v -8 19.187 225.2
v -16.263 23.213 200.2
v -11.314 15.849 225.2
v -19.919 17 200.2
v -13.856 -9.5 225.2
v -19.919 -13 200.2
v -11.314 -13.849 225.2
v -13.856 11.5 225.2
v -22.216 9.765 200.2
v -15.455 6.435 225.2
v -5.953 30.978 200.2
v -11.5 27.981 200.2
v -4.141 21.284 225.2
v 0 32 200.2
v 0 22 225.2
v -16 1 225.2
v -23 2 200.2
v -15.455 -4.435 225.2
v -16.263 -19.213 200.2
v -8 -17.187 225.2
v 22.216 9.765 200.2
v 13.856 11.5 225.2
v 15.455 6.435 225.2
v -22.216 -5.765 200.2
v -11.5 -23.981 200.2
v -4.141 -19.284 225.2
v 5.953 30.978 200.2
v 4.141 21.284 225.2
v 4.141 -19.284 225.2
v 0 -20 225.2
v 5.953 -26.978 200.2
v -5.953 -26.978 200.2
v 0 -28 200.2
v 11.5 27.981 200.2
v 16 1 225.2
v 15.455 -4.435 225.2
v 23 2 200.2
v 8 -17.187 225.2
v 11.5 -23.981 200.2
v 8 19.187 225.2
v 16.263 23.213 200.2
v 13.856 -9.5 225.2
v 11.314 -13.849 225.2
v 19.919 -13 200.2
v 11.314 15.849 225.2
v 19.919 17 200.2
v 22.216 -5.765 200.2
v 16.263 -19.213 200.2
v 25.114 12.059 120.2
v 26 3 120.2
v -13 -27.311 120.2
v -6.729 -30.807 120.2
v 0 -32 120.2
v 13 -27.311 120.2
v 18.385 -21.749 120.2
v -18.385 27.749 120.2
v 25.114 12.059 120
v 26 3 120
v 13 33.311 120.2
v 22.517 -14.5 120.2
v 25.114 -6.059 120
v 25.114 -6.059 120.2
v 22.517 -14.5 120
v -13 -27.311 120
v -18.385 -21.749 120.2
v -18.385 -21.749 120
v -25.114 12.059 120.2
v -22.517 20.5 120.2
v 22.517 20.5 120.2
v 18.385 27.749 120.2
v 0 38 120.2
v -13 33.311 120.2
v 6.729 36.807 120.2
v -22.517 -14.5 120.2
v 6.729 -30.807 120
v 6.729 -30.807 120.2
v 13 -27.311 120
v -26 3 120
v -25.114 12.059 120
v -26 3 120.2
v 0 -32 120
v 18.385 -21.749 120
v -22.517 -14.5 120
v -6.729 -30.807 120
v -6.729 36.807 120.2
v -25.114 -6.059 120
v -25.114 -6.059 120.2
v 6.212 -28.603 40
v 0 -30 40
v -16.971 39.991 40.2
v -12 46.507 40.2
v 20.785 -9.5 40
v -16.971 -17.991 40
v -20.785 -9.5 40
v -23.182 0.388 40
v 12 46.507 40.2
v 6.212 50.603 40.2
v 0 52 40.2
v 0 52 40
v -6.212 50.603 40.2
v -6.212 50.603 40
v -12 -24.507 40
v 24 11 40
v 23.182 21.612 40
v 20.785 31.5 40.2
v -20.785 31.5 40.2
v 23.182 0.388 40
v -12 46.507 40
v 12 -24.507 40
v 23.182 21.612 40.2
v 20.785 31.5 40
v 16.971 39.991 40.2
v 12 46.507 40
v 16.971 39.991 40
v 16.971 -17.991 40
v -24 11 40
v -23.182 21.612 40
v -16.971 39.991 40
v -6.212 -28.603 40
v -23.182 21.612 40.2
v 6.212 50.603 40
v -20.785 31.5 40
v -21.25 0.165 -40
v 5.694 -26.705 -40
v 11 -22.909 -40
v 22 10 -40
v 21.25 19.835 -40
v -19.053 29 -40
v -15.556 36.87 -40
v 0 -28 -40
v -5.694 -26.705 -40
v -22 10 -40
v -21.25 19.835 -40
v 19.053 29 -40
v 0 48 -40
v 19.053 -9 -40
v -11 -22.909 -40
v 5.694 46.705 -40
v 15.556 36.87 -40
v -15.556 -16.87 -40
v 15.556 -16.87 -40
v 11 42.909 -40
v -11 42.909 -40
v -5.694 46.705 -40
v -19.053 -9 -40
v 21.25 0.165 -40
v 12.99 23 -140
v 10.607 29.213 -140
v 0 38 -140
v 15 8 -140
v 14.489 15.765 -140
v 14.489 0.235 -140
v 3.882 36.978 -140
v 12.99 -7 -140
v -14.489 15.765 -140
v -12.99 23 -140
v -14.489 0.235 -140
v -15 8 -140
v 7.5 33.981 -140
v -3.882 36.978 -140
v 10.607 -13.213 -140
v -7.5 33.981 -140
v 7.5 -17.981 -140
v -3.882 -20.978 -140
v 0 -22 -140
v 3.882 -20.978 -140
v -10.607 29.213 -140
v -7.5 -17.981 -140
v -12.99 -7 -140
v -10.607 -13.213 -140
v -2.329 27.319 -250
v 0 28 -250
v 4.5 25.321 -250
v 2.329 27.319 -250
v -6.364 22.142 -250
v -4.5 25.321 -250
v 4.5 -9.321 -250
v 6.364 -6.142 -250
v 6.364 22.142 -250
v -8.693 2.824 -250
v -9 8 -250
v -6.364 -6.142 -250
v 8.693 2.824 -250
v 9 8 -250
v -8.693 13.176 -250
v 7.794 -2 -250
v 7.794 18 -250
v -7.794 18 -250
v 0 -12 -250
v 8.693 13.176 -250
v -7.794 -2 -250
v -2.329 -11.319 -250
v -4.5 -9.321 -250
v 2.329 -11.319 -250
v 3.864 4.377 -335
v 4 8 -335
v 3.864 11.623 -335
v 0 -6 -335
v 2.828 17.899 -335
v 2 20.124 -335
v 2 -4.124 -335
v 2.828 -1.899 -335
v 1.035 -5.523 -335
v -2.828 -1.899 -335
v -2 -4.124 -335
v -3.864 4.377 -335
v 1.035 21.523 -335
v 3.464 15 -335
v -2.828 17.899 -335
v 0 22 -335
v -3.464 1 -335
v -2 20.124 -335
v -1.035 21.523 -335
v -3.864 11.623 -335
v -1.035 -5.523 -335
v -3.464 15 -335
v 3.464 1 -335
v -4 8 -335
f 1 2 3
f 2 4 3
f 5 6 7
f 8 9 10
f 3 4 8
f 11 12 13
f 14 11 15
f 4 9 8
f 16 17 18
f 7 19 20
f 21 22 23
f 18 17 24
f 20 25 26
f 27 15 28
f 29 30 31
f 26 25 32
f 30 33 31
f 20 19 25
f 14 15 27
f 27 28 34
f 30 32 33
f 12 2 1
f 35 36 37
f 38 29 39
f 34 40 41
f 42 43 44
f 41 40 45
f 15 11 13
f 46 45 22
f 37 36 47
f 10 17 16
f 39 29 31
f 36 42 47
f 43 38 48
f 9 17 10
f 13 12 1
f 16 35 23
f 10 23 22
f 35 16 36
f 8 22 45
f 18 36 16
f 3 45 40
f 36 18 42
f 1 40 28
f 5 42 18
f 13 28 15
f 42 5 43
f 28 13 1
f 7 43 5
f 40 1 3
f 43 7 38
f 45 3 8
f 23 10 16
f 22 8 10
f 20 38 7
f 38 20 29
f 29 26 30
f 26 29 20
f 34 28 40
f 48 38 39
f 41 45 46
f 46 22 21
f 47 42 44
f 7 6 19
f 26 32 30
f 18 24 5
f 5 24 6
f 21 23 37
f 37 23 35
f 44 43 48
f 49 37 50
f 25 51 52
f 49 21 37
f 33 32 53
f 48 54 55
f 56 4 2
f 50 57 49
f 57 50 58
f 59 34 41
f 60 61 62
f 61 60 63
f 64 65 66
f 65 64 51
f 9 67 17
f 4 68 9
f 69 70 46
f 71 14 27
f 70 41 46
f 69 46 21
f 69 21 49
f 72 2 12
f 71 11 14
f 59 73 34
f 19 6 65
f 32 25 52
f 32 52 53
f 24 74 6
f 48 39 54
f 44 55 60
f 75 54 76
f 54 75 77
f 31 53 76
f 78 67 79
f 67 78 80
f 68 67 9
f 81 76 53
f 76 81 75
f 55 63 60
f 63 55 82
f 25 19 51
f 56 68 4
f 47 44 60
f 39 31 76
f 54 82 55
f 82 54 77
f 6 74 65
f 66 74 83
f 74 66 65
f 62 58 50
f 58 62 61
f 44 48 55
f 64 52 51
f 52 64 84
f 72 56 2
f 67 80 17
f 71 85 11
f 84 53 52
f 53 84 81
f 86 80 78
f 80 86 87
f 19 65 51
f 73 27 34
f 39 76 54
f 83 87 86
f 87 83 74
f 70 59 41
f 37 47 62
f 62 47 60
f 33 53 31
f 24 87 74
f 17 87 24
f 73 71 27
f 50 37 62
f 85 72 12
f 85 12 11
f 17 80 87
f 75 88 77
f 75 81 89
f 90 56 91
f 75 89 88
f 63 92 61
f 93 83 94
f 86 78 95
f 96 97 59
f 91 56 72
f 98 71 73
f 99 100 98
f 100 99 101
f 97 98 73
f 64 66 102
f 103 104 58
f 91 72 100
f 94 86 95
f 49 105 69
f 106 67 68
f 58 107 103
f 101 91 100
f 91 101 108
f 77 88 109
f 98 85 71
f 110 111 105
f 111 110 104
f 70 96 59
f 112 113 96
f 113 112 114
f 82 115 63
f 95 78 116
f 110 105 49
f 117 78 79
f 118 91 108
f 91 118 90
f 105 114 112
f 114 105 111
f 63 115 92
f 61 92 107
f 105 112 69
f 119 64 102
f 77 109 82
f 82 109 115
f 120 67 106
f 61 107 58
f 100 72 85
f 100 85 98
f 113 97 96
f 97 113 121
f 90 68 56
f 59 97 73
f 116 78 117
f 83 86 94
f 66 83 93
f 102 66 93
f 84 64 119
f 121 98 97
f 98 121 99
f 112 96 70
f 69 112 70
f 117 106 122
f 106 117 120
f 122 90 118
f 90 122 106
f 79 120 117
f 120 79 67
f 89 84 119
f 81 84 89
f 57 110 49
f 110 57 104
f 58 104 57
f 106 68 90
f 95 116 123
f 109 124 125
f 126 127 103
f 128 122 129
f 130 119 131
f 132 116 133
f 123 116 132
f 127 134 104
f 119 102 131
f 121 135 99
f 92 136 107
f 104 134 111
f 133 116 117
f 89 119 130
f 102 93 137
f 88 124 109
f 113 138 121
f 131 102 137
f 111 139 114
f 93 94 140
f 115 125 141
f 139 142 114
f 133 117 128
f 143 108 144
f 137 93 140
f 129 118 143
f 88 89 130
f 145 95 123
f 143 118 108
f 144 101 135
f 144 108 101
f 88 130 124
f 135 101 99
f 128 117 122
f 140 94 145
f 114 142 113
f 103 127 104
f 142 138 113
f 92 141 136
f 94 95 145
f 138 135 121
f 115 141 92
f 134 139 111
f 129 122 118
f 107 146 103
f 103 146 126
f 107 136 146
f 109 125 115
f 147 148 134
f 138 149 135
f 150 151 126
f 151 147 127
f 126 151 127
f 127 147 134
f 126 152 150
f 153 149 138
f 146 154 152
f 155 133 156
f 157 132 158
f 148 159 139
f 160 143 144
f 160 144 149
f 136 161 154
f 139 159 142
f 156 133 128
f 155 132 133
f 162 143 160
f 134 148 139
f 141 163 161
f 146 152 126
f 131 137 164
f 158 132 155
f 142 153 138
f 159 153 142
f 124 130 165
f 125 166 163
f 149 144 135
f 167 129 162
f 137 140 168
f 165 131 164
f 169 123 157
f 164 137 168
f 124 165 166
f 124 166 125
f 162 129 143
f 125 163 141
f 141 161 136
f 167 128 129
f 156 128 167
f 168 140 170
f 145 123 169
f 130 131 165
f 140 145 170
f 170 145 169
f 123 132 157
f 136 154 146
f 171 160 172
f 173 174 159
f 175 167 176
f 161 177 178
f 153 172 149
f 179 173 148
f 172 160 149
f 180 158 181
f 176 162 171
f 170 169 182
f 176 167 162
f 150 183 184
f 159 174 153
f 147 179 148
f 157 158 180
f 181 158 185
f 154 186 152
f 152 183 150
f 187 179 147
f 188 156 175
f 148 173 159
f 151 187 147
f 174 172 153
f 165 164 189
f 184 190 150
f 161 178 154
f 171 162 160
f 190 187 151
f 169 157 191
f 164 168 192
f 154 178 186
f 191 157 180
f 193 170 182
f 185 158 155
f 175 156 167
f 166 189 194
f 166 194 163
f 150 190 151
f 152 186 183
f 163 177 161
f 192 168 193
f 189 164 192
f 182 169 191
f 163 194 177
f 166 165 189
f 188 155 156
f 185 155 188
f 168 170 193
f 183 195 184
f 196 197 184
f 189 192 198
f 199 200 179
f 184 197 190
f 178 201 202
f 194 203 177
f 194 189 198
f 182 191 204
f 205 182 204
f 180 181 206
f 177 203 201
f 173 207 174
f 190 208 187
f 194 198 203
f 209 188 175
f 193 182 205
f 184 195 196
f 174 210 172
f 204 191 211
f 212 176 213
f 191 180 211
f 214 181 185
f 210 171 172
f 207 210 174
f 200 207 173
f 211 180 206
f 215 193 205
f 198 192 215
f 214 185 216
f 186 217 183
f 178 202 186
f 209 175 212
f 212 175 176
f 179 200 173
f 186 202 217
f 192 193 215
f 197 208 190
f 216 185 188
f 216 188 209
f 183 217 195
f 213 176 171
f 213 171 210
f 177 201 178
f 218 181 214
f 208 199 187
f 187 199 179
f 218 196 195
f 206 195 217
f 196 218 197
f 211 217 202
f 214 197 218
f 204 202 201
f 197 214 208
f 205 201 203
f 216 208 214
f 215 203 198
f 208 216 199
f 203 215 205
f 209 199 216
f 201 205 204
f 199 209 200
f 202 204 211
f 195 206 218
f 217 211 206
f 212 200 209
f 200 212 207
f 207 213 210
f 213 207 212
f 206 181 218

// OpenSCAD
// ESA-style foam fighter, parametric. Original work (CC0). Units: mm. Axes: x right, y up, z forward, origin near the CG,
// so an STL loads straight into the sim after scaling by 0.001 (nose along +Z, y up).
// Proportions follow an ESA WWII kit: span 800 mm, length about 600 mm, tail surfaces as flat EPP plates, wing dihedral 60 mm at the tip
// (ef3m.pl Hurricane ESA kit page and build guide, see docs/models.md). Outlines are stylised, not a scale drawing.
//
// Export one part at a time, e.g.:
//   openscad -D 'plane="spitfire"' -D 'part="wing"' -o wing.stl esa_plane.scad
// parts: fuselage, wing, tail, canopy, spinner, prop
plane = "spitfire";
part = "fuselage";

// ---- per-plane data ----
// Fuselage stations from nose to tail: [z, yTop, yBottom, halfWidth]
function stations(p) =
  p == "spitfire" ? [[225,22,-20,16],[200,32,-28,23],[120,38,-32,26],[40,52,-30,24],[-40,48,-28,22],[-140,38,-22,15],[-250,28,-12,9],[-335,22,-6,4]] :
  p == "hurricane" ? [[225,26,-24,19],[190,36,-32,26],[110,44,-34,27],[30,62,-32,25],[-60,58,-26,20],[-160,42,-18,13],[-260,30,-10,8],[-335,24,-4,3]] :
  p == "fw190" ? [[225,34,-34,31],[200,40,-38,34],[130,40,-36,28],[40,52,-30,24],[-50,46,-26,19],[-150,36,-18,12],[-250,28,-10,8],[-335,22,-4,3]] :
  /* yak3 */      [[225,22,-20,16],[190,28,-26,21],[110,36,-30,23],[30,50,-28,22],[-60,44,-26,18],[-160,34,-18,12],[-255,26,-9,7],[-335,20,-4,3]];

SPAN = 800;                  // ESA WWII single-engine: 700-860 mm (§3.1.2)
function chordAt(p, u) =     // u = 0 root .. 1 tip
  p == "spitfire" ? 52 + 98 * sqrt(1 - u * u) :           // elliptical planform
  p == "hurricane" ? 160 - 70 * u :
  p == "fw190" ? 150 - 62 * u :
  /* yak3 */        145 - 66 * u;
function teAt(p, u) = p == "spitfire" ? -100 : -100 + (p == "fw190" ? 14 * u : 0);  // trailing edge z (spitfire: straight TE)
WING_Y = -10;                // low wing, root height
DIHEDRAL = 60;               // tip height above root (kit guide: 60 mm)
N = 8;                       // wing stations per half

// ---- helpers ----
module slice(z, yt, yb, hw) { translate([0, (yt + yb) / 2, z]) scale([hw, (yt - yb) / 2, 1]) cylinder(r = 1, h = 0.2, $fn = 24); }
module fuselage() {
  st = stations(plane);
  for (i = [0 : len(st) - 2]) hull() { slice(st[i][0], st[i][1], st[i][2], st[i][3]); slice(st[i+1][0], st[i+1][1], st[i+1][2], st[i+1][3]); }
}
// airfoil-ish section (flat bottom, domed top) at span position x, chord from te to le, thickness t, height y
module section(x, y, le, te, t) {
  c = le - te;
  multmatrix([[0,0,1,x],[0,1,0,y],[1,0,0,te],[0,0,0,1]])    // 2D (a,b) -> (z = te + a, y = y + b), extruded along x
    linear_extrude(height = 0.4) polygon([[0,0],[c*0.02,t*0.55],[c*0.25,t],[c*0.6,t*0.6],[c,0.4],[c*0.6,0],[c*0.1,0]]);
}
module wing_half(sgn) {
  for (i = [0 : N - 1]) {
    u0 = i / N; u1 = (i + 1) / N;
    c0 = chordAt(plane, u0); c1 = chordAt(plane, u1);
    hull() {
      section(sgn * u0 * SPAN / 2, WING_Y + DIHEDRAL * u0, teAt(plane, u0) + c0, teAt(plane, u0), c0 * 0.10);
      section(sgn * u1 * SPAN / 2, WING_Y + DIHEDRAL * u1, teAt(plane, u1) + c1, teAt(plane, u1), c1 * 0.08);
    }
  }
}
module wing() { wing_half(1); wing_half(-1); }
module plate_h(span, c_root, c_tip, z_te, y, t) {         // flat EPP stabiliser
  translate([0, y, 0]) linear_extrude(height = t, center = true)
    polygon([[-span/2, z_te + c_tip], [-span/2, z_te], [span/2, z_te], [span/2, z_te + c_tip], [0.0, z_te + c_root]]);
}
module tail() {
  // horizontal plate: lies in the xz plane at height 8 mm, 6 mm thick
  rotate([90, 0, 0]) translate([0, 0, -8 - 3]) linear_extrude(height = 6)
    polygon([[-140, -300], [-140, -335], [140, -335], [140, -300], [0, -245]]);
  // fin: vertical plate in the yz plane at x = 0, 6 mm thick. 2D (a,b) -> (z = a, y = b), extruded along x.
  multmatrix([[0,0,1,-3],[0,1,0,0],[1,0,0,0],[0,0,0,1]]) linear_extrude(height = 6)
    polygon([[-335, 10], [-335, 112], [-300, 108], [-225, 18]]);
}
module canopy() {
  translate([0, 50, plane == "hurricane" ? 20 : 45]) scale([19, 16, 52]) sphere(r = 1, $fn = 20);
}
module spinner() { translate([0, 0, 225]) rotate([0, 0, 0]) cylinder(r1 = 30, r2 = 2, h = 42, $fn = 28); }
module prop() {   // 9 in (229 mm) two-blade prop, hub at the origin, disc in the xy plane
  for (a = [0, 180]) rotate([0, 0, a]) hull() { translate([0, 6, 0]) cylinder(r = 5, h = 3, $fn = 12); translate([0, 112, 0]) scale([7, 2, 1]) cylinder(r = 1, h = 2, $fn = 12); }
}

if (part == "fuselage") fuselage();
else if (part == "wing") wing();
else if (part == "tail") tail();
else if (part == "canopy") canopy();
else if (part == "spinner") spinner();
else if (part == "prop") prop();
